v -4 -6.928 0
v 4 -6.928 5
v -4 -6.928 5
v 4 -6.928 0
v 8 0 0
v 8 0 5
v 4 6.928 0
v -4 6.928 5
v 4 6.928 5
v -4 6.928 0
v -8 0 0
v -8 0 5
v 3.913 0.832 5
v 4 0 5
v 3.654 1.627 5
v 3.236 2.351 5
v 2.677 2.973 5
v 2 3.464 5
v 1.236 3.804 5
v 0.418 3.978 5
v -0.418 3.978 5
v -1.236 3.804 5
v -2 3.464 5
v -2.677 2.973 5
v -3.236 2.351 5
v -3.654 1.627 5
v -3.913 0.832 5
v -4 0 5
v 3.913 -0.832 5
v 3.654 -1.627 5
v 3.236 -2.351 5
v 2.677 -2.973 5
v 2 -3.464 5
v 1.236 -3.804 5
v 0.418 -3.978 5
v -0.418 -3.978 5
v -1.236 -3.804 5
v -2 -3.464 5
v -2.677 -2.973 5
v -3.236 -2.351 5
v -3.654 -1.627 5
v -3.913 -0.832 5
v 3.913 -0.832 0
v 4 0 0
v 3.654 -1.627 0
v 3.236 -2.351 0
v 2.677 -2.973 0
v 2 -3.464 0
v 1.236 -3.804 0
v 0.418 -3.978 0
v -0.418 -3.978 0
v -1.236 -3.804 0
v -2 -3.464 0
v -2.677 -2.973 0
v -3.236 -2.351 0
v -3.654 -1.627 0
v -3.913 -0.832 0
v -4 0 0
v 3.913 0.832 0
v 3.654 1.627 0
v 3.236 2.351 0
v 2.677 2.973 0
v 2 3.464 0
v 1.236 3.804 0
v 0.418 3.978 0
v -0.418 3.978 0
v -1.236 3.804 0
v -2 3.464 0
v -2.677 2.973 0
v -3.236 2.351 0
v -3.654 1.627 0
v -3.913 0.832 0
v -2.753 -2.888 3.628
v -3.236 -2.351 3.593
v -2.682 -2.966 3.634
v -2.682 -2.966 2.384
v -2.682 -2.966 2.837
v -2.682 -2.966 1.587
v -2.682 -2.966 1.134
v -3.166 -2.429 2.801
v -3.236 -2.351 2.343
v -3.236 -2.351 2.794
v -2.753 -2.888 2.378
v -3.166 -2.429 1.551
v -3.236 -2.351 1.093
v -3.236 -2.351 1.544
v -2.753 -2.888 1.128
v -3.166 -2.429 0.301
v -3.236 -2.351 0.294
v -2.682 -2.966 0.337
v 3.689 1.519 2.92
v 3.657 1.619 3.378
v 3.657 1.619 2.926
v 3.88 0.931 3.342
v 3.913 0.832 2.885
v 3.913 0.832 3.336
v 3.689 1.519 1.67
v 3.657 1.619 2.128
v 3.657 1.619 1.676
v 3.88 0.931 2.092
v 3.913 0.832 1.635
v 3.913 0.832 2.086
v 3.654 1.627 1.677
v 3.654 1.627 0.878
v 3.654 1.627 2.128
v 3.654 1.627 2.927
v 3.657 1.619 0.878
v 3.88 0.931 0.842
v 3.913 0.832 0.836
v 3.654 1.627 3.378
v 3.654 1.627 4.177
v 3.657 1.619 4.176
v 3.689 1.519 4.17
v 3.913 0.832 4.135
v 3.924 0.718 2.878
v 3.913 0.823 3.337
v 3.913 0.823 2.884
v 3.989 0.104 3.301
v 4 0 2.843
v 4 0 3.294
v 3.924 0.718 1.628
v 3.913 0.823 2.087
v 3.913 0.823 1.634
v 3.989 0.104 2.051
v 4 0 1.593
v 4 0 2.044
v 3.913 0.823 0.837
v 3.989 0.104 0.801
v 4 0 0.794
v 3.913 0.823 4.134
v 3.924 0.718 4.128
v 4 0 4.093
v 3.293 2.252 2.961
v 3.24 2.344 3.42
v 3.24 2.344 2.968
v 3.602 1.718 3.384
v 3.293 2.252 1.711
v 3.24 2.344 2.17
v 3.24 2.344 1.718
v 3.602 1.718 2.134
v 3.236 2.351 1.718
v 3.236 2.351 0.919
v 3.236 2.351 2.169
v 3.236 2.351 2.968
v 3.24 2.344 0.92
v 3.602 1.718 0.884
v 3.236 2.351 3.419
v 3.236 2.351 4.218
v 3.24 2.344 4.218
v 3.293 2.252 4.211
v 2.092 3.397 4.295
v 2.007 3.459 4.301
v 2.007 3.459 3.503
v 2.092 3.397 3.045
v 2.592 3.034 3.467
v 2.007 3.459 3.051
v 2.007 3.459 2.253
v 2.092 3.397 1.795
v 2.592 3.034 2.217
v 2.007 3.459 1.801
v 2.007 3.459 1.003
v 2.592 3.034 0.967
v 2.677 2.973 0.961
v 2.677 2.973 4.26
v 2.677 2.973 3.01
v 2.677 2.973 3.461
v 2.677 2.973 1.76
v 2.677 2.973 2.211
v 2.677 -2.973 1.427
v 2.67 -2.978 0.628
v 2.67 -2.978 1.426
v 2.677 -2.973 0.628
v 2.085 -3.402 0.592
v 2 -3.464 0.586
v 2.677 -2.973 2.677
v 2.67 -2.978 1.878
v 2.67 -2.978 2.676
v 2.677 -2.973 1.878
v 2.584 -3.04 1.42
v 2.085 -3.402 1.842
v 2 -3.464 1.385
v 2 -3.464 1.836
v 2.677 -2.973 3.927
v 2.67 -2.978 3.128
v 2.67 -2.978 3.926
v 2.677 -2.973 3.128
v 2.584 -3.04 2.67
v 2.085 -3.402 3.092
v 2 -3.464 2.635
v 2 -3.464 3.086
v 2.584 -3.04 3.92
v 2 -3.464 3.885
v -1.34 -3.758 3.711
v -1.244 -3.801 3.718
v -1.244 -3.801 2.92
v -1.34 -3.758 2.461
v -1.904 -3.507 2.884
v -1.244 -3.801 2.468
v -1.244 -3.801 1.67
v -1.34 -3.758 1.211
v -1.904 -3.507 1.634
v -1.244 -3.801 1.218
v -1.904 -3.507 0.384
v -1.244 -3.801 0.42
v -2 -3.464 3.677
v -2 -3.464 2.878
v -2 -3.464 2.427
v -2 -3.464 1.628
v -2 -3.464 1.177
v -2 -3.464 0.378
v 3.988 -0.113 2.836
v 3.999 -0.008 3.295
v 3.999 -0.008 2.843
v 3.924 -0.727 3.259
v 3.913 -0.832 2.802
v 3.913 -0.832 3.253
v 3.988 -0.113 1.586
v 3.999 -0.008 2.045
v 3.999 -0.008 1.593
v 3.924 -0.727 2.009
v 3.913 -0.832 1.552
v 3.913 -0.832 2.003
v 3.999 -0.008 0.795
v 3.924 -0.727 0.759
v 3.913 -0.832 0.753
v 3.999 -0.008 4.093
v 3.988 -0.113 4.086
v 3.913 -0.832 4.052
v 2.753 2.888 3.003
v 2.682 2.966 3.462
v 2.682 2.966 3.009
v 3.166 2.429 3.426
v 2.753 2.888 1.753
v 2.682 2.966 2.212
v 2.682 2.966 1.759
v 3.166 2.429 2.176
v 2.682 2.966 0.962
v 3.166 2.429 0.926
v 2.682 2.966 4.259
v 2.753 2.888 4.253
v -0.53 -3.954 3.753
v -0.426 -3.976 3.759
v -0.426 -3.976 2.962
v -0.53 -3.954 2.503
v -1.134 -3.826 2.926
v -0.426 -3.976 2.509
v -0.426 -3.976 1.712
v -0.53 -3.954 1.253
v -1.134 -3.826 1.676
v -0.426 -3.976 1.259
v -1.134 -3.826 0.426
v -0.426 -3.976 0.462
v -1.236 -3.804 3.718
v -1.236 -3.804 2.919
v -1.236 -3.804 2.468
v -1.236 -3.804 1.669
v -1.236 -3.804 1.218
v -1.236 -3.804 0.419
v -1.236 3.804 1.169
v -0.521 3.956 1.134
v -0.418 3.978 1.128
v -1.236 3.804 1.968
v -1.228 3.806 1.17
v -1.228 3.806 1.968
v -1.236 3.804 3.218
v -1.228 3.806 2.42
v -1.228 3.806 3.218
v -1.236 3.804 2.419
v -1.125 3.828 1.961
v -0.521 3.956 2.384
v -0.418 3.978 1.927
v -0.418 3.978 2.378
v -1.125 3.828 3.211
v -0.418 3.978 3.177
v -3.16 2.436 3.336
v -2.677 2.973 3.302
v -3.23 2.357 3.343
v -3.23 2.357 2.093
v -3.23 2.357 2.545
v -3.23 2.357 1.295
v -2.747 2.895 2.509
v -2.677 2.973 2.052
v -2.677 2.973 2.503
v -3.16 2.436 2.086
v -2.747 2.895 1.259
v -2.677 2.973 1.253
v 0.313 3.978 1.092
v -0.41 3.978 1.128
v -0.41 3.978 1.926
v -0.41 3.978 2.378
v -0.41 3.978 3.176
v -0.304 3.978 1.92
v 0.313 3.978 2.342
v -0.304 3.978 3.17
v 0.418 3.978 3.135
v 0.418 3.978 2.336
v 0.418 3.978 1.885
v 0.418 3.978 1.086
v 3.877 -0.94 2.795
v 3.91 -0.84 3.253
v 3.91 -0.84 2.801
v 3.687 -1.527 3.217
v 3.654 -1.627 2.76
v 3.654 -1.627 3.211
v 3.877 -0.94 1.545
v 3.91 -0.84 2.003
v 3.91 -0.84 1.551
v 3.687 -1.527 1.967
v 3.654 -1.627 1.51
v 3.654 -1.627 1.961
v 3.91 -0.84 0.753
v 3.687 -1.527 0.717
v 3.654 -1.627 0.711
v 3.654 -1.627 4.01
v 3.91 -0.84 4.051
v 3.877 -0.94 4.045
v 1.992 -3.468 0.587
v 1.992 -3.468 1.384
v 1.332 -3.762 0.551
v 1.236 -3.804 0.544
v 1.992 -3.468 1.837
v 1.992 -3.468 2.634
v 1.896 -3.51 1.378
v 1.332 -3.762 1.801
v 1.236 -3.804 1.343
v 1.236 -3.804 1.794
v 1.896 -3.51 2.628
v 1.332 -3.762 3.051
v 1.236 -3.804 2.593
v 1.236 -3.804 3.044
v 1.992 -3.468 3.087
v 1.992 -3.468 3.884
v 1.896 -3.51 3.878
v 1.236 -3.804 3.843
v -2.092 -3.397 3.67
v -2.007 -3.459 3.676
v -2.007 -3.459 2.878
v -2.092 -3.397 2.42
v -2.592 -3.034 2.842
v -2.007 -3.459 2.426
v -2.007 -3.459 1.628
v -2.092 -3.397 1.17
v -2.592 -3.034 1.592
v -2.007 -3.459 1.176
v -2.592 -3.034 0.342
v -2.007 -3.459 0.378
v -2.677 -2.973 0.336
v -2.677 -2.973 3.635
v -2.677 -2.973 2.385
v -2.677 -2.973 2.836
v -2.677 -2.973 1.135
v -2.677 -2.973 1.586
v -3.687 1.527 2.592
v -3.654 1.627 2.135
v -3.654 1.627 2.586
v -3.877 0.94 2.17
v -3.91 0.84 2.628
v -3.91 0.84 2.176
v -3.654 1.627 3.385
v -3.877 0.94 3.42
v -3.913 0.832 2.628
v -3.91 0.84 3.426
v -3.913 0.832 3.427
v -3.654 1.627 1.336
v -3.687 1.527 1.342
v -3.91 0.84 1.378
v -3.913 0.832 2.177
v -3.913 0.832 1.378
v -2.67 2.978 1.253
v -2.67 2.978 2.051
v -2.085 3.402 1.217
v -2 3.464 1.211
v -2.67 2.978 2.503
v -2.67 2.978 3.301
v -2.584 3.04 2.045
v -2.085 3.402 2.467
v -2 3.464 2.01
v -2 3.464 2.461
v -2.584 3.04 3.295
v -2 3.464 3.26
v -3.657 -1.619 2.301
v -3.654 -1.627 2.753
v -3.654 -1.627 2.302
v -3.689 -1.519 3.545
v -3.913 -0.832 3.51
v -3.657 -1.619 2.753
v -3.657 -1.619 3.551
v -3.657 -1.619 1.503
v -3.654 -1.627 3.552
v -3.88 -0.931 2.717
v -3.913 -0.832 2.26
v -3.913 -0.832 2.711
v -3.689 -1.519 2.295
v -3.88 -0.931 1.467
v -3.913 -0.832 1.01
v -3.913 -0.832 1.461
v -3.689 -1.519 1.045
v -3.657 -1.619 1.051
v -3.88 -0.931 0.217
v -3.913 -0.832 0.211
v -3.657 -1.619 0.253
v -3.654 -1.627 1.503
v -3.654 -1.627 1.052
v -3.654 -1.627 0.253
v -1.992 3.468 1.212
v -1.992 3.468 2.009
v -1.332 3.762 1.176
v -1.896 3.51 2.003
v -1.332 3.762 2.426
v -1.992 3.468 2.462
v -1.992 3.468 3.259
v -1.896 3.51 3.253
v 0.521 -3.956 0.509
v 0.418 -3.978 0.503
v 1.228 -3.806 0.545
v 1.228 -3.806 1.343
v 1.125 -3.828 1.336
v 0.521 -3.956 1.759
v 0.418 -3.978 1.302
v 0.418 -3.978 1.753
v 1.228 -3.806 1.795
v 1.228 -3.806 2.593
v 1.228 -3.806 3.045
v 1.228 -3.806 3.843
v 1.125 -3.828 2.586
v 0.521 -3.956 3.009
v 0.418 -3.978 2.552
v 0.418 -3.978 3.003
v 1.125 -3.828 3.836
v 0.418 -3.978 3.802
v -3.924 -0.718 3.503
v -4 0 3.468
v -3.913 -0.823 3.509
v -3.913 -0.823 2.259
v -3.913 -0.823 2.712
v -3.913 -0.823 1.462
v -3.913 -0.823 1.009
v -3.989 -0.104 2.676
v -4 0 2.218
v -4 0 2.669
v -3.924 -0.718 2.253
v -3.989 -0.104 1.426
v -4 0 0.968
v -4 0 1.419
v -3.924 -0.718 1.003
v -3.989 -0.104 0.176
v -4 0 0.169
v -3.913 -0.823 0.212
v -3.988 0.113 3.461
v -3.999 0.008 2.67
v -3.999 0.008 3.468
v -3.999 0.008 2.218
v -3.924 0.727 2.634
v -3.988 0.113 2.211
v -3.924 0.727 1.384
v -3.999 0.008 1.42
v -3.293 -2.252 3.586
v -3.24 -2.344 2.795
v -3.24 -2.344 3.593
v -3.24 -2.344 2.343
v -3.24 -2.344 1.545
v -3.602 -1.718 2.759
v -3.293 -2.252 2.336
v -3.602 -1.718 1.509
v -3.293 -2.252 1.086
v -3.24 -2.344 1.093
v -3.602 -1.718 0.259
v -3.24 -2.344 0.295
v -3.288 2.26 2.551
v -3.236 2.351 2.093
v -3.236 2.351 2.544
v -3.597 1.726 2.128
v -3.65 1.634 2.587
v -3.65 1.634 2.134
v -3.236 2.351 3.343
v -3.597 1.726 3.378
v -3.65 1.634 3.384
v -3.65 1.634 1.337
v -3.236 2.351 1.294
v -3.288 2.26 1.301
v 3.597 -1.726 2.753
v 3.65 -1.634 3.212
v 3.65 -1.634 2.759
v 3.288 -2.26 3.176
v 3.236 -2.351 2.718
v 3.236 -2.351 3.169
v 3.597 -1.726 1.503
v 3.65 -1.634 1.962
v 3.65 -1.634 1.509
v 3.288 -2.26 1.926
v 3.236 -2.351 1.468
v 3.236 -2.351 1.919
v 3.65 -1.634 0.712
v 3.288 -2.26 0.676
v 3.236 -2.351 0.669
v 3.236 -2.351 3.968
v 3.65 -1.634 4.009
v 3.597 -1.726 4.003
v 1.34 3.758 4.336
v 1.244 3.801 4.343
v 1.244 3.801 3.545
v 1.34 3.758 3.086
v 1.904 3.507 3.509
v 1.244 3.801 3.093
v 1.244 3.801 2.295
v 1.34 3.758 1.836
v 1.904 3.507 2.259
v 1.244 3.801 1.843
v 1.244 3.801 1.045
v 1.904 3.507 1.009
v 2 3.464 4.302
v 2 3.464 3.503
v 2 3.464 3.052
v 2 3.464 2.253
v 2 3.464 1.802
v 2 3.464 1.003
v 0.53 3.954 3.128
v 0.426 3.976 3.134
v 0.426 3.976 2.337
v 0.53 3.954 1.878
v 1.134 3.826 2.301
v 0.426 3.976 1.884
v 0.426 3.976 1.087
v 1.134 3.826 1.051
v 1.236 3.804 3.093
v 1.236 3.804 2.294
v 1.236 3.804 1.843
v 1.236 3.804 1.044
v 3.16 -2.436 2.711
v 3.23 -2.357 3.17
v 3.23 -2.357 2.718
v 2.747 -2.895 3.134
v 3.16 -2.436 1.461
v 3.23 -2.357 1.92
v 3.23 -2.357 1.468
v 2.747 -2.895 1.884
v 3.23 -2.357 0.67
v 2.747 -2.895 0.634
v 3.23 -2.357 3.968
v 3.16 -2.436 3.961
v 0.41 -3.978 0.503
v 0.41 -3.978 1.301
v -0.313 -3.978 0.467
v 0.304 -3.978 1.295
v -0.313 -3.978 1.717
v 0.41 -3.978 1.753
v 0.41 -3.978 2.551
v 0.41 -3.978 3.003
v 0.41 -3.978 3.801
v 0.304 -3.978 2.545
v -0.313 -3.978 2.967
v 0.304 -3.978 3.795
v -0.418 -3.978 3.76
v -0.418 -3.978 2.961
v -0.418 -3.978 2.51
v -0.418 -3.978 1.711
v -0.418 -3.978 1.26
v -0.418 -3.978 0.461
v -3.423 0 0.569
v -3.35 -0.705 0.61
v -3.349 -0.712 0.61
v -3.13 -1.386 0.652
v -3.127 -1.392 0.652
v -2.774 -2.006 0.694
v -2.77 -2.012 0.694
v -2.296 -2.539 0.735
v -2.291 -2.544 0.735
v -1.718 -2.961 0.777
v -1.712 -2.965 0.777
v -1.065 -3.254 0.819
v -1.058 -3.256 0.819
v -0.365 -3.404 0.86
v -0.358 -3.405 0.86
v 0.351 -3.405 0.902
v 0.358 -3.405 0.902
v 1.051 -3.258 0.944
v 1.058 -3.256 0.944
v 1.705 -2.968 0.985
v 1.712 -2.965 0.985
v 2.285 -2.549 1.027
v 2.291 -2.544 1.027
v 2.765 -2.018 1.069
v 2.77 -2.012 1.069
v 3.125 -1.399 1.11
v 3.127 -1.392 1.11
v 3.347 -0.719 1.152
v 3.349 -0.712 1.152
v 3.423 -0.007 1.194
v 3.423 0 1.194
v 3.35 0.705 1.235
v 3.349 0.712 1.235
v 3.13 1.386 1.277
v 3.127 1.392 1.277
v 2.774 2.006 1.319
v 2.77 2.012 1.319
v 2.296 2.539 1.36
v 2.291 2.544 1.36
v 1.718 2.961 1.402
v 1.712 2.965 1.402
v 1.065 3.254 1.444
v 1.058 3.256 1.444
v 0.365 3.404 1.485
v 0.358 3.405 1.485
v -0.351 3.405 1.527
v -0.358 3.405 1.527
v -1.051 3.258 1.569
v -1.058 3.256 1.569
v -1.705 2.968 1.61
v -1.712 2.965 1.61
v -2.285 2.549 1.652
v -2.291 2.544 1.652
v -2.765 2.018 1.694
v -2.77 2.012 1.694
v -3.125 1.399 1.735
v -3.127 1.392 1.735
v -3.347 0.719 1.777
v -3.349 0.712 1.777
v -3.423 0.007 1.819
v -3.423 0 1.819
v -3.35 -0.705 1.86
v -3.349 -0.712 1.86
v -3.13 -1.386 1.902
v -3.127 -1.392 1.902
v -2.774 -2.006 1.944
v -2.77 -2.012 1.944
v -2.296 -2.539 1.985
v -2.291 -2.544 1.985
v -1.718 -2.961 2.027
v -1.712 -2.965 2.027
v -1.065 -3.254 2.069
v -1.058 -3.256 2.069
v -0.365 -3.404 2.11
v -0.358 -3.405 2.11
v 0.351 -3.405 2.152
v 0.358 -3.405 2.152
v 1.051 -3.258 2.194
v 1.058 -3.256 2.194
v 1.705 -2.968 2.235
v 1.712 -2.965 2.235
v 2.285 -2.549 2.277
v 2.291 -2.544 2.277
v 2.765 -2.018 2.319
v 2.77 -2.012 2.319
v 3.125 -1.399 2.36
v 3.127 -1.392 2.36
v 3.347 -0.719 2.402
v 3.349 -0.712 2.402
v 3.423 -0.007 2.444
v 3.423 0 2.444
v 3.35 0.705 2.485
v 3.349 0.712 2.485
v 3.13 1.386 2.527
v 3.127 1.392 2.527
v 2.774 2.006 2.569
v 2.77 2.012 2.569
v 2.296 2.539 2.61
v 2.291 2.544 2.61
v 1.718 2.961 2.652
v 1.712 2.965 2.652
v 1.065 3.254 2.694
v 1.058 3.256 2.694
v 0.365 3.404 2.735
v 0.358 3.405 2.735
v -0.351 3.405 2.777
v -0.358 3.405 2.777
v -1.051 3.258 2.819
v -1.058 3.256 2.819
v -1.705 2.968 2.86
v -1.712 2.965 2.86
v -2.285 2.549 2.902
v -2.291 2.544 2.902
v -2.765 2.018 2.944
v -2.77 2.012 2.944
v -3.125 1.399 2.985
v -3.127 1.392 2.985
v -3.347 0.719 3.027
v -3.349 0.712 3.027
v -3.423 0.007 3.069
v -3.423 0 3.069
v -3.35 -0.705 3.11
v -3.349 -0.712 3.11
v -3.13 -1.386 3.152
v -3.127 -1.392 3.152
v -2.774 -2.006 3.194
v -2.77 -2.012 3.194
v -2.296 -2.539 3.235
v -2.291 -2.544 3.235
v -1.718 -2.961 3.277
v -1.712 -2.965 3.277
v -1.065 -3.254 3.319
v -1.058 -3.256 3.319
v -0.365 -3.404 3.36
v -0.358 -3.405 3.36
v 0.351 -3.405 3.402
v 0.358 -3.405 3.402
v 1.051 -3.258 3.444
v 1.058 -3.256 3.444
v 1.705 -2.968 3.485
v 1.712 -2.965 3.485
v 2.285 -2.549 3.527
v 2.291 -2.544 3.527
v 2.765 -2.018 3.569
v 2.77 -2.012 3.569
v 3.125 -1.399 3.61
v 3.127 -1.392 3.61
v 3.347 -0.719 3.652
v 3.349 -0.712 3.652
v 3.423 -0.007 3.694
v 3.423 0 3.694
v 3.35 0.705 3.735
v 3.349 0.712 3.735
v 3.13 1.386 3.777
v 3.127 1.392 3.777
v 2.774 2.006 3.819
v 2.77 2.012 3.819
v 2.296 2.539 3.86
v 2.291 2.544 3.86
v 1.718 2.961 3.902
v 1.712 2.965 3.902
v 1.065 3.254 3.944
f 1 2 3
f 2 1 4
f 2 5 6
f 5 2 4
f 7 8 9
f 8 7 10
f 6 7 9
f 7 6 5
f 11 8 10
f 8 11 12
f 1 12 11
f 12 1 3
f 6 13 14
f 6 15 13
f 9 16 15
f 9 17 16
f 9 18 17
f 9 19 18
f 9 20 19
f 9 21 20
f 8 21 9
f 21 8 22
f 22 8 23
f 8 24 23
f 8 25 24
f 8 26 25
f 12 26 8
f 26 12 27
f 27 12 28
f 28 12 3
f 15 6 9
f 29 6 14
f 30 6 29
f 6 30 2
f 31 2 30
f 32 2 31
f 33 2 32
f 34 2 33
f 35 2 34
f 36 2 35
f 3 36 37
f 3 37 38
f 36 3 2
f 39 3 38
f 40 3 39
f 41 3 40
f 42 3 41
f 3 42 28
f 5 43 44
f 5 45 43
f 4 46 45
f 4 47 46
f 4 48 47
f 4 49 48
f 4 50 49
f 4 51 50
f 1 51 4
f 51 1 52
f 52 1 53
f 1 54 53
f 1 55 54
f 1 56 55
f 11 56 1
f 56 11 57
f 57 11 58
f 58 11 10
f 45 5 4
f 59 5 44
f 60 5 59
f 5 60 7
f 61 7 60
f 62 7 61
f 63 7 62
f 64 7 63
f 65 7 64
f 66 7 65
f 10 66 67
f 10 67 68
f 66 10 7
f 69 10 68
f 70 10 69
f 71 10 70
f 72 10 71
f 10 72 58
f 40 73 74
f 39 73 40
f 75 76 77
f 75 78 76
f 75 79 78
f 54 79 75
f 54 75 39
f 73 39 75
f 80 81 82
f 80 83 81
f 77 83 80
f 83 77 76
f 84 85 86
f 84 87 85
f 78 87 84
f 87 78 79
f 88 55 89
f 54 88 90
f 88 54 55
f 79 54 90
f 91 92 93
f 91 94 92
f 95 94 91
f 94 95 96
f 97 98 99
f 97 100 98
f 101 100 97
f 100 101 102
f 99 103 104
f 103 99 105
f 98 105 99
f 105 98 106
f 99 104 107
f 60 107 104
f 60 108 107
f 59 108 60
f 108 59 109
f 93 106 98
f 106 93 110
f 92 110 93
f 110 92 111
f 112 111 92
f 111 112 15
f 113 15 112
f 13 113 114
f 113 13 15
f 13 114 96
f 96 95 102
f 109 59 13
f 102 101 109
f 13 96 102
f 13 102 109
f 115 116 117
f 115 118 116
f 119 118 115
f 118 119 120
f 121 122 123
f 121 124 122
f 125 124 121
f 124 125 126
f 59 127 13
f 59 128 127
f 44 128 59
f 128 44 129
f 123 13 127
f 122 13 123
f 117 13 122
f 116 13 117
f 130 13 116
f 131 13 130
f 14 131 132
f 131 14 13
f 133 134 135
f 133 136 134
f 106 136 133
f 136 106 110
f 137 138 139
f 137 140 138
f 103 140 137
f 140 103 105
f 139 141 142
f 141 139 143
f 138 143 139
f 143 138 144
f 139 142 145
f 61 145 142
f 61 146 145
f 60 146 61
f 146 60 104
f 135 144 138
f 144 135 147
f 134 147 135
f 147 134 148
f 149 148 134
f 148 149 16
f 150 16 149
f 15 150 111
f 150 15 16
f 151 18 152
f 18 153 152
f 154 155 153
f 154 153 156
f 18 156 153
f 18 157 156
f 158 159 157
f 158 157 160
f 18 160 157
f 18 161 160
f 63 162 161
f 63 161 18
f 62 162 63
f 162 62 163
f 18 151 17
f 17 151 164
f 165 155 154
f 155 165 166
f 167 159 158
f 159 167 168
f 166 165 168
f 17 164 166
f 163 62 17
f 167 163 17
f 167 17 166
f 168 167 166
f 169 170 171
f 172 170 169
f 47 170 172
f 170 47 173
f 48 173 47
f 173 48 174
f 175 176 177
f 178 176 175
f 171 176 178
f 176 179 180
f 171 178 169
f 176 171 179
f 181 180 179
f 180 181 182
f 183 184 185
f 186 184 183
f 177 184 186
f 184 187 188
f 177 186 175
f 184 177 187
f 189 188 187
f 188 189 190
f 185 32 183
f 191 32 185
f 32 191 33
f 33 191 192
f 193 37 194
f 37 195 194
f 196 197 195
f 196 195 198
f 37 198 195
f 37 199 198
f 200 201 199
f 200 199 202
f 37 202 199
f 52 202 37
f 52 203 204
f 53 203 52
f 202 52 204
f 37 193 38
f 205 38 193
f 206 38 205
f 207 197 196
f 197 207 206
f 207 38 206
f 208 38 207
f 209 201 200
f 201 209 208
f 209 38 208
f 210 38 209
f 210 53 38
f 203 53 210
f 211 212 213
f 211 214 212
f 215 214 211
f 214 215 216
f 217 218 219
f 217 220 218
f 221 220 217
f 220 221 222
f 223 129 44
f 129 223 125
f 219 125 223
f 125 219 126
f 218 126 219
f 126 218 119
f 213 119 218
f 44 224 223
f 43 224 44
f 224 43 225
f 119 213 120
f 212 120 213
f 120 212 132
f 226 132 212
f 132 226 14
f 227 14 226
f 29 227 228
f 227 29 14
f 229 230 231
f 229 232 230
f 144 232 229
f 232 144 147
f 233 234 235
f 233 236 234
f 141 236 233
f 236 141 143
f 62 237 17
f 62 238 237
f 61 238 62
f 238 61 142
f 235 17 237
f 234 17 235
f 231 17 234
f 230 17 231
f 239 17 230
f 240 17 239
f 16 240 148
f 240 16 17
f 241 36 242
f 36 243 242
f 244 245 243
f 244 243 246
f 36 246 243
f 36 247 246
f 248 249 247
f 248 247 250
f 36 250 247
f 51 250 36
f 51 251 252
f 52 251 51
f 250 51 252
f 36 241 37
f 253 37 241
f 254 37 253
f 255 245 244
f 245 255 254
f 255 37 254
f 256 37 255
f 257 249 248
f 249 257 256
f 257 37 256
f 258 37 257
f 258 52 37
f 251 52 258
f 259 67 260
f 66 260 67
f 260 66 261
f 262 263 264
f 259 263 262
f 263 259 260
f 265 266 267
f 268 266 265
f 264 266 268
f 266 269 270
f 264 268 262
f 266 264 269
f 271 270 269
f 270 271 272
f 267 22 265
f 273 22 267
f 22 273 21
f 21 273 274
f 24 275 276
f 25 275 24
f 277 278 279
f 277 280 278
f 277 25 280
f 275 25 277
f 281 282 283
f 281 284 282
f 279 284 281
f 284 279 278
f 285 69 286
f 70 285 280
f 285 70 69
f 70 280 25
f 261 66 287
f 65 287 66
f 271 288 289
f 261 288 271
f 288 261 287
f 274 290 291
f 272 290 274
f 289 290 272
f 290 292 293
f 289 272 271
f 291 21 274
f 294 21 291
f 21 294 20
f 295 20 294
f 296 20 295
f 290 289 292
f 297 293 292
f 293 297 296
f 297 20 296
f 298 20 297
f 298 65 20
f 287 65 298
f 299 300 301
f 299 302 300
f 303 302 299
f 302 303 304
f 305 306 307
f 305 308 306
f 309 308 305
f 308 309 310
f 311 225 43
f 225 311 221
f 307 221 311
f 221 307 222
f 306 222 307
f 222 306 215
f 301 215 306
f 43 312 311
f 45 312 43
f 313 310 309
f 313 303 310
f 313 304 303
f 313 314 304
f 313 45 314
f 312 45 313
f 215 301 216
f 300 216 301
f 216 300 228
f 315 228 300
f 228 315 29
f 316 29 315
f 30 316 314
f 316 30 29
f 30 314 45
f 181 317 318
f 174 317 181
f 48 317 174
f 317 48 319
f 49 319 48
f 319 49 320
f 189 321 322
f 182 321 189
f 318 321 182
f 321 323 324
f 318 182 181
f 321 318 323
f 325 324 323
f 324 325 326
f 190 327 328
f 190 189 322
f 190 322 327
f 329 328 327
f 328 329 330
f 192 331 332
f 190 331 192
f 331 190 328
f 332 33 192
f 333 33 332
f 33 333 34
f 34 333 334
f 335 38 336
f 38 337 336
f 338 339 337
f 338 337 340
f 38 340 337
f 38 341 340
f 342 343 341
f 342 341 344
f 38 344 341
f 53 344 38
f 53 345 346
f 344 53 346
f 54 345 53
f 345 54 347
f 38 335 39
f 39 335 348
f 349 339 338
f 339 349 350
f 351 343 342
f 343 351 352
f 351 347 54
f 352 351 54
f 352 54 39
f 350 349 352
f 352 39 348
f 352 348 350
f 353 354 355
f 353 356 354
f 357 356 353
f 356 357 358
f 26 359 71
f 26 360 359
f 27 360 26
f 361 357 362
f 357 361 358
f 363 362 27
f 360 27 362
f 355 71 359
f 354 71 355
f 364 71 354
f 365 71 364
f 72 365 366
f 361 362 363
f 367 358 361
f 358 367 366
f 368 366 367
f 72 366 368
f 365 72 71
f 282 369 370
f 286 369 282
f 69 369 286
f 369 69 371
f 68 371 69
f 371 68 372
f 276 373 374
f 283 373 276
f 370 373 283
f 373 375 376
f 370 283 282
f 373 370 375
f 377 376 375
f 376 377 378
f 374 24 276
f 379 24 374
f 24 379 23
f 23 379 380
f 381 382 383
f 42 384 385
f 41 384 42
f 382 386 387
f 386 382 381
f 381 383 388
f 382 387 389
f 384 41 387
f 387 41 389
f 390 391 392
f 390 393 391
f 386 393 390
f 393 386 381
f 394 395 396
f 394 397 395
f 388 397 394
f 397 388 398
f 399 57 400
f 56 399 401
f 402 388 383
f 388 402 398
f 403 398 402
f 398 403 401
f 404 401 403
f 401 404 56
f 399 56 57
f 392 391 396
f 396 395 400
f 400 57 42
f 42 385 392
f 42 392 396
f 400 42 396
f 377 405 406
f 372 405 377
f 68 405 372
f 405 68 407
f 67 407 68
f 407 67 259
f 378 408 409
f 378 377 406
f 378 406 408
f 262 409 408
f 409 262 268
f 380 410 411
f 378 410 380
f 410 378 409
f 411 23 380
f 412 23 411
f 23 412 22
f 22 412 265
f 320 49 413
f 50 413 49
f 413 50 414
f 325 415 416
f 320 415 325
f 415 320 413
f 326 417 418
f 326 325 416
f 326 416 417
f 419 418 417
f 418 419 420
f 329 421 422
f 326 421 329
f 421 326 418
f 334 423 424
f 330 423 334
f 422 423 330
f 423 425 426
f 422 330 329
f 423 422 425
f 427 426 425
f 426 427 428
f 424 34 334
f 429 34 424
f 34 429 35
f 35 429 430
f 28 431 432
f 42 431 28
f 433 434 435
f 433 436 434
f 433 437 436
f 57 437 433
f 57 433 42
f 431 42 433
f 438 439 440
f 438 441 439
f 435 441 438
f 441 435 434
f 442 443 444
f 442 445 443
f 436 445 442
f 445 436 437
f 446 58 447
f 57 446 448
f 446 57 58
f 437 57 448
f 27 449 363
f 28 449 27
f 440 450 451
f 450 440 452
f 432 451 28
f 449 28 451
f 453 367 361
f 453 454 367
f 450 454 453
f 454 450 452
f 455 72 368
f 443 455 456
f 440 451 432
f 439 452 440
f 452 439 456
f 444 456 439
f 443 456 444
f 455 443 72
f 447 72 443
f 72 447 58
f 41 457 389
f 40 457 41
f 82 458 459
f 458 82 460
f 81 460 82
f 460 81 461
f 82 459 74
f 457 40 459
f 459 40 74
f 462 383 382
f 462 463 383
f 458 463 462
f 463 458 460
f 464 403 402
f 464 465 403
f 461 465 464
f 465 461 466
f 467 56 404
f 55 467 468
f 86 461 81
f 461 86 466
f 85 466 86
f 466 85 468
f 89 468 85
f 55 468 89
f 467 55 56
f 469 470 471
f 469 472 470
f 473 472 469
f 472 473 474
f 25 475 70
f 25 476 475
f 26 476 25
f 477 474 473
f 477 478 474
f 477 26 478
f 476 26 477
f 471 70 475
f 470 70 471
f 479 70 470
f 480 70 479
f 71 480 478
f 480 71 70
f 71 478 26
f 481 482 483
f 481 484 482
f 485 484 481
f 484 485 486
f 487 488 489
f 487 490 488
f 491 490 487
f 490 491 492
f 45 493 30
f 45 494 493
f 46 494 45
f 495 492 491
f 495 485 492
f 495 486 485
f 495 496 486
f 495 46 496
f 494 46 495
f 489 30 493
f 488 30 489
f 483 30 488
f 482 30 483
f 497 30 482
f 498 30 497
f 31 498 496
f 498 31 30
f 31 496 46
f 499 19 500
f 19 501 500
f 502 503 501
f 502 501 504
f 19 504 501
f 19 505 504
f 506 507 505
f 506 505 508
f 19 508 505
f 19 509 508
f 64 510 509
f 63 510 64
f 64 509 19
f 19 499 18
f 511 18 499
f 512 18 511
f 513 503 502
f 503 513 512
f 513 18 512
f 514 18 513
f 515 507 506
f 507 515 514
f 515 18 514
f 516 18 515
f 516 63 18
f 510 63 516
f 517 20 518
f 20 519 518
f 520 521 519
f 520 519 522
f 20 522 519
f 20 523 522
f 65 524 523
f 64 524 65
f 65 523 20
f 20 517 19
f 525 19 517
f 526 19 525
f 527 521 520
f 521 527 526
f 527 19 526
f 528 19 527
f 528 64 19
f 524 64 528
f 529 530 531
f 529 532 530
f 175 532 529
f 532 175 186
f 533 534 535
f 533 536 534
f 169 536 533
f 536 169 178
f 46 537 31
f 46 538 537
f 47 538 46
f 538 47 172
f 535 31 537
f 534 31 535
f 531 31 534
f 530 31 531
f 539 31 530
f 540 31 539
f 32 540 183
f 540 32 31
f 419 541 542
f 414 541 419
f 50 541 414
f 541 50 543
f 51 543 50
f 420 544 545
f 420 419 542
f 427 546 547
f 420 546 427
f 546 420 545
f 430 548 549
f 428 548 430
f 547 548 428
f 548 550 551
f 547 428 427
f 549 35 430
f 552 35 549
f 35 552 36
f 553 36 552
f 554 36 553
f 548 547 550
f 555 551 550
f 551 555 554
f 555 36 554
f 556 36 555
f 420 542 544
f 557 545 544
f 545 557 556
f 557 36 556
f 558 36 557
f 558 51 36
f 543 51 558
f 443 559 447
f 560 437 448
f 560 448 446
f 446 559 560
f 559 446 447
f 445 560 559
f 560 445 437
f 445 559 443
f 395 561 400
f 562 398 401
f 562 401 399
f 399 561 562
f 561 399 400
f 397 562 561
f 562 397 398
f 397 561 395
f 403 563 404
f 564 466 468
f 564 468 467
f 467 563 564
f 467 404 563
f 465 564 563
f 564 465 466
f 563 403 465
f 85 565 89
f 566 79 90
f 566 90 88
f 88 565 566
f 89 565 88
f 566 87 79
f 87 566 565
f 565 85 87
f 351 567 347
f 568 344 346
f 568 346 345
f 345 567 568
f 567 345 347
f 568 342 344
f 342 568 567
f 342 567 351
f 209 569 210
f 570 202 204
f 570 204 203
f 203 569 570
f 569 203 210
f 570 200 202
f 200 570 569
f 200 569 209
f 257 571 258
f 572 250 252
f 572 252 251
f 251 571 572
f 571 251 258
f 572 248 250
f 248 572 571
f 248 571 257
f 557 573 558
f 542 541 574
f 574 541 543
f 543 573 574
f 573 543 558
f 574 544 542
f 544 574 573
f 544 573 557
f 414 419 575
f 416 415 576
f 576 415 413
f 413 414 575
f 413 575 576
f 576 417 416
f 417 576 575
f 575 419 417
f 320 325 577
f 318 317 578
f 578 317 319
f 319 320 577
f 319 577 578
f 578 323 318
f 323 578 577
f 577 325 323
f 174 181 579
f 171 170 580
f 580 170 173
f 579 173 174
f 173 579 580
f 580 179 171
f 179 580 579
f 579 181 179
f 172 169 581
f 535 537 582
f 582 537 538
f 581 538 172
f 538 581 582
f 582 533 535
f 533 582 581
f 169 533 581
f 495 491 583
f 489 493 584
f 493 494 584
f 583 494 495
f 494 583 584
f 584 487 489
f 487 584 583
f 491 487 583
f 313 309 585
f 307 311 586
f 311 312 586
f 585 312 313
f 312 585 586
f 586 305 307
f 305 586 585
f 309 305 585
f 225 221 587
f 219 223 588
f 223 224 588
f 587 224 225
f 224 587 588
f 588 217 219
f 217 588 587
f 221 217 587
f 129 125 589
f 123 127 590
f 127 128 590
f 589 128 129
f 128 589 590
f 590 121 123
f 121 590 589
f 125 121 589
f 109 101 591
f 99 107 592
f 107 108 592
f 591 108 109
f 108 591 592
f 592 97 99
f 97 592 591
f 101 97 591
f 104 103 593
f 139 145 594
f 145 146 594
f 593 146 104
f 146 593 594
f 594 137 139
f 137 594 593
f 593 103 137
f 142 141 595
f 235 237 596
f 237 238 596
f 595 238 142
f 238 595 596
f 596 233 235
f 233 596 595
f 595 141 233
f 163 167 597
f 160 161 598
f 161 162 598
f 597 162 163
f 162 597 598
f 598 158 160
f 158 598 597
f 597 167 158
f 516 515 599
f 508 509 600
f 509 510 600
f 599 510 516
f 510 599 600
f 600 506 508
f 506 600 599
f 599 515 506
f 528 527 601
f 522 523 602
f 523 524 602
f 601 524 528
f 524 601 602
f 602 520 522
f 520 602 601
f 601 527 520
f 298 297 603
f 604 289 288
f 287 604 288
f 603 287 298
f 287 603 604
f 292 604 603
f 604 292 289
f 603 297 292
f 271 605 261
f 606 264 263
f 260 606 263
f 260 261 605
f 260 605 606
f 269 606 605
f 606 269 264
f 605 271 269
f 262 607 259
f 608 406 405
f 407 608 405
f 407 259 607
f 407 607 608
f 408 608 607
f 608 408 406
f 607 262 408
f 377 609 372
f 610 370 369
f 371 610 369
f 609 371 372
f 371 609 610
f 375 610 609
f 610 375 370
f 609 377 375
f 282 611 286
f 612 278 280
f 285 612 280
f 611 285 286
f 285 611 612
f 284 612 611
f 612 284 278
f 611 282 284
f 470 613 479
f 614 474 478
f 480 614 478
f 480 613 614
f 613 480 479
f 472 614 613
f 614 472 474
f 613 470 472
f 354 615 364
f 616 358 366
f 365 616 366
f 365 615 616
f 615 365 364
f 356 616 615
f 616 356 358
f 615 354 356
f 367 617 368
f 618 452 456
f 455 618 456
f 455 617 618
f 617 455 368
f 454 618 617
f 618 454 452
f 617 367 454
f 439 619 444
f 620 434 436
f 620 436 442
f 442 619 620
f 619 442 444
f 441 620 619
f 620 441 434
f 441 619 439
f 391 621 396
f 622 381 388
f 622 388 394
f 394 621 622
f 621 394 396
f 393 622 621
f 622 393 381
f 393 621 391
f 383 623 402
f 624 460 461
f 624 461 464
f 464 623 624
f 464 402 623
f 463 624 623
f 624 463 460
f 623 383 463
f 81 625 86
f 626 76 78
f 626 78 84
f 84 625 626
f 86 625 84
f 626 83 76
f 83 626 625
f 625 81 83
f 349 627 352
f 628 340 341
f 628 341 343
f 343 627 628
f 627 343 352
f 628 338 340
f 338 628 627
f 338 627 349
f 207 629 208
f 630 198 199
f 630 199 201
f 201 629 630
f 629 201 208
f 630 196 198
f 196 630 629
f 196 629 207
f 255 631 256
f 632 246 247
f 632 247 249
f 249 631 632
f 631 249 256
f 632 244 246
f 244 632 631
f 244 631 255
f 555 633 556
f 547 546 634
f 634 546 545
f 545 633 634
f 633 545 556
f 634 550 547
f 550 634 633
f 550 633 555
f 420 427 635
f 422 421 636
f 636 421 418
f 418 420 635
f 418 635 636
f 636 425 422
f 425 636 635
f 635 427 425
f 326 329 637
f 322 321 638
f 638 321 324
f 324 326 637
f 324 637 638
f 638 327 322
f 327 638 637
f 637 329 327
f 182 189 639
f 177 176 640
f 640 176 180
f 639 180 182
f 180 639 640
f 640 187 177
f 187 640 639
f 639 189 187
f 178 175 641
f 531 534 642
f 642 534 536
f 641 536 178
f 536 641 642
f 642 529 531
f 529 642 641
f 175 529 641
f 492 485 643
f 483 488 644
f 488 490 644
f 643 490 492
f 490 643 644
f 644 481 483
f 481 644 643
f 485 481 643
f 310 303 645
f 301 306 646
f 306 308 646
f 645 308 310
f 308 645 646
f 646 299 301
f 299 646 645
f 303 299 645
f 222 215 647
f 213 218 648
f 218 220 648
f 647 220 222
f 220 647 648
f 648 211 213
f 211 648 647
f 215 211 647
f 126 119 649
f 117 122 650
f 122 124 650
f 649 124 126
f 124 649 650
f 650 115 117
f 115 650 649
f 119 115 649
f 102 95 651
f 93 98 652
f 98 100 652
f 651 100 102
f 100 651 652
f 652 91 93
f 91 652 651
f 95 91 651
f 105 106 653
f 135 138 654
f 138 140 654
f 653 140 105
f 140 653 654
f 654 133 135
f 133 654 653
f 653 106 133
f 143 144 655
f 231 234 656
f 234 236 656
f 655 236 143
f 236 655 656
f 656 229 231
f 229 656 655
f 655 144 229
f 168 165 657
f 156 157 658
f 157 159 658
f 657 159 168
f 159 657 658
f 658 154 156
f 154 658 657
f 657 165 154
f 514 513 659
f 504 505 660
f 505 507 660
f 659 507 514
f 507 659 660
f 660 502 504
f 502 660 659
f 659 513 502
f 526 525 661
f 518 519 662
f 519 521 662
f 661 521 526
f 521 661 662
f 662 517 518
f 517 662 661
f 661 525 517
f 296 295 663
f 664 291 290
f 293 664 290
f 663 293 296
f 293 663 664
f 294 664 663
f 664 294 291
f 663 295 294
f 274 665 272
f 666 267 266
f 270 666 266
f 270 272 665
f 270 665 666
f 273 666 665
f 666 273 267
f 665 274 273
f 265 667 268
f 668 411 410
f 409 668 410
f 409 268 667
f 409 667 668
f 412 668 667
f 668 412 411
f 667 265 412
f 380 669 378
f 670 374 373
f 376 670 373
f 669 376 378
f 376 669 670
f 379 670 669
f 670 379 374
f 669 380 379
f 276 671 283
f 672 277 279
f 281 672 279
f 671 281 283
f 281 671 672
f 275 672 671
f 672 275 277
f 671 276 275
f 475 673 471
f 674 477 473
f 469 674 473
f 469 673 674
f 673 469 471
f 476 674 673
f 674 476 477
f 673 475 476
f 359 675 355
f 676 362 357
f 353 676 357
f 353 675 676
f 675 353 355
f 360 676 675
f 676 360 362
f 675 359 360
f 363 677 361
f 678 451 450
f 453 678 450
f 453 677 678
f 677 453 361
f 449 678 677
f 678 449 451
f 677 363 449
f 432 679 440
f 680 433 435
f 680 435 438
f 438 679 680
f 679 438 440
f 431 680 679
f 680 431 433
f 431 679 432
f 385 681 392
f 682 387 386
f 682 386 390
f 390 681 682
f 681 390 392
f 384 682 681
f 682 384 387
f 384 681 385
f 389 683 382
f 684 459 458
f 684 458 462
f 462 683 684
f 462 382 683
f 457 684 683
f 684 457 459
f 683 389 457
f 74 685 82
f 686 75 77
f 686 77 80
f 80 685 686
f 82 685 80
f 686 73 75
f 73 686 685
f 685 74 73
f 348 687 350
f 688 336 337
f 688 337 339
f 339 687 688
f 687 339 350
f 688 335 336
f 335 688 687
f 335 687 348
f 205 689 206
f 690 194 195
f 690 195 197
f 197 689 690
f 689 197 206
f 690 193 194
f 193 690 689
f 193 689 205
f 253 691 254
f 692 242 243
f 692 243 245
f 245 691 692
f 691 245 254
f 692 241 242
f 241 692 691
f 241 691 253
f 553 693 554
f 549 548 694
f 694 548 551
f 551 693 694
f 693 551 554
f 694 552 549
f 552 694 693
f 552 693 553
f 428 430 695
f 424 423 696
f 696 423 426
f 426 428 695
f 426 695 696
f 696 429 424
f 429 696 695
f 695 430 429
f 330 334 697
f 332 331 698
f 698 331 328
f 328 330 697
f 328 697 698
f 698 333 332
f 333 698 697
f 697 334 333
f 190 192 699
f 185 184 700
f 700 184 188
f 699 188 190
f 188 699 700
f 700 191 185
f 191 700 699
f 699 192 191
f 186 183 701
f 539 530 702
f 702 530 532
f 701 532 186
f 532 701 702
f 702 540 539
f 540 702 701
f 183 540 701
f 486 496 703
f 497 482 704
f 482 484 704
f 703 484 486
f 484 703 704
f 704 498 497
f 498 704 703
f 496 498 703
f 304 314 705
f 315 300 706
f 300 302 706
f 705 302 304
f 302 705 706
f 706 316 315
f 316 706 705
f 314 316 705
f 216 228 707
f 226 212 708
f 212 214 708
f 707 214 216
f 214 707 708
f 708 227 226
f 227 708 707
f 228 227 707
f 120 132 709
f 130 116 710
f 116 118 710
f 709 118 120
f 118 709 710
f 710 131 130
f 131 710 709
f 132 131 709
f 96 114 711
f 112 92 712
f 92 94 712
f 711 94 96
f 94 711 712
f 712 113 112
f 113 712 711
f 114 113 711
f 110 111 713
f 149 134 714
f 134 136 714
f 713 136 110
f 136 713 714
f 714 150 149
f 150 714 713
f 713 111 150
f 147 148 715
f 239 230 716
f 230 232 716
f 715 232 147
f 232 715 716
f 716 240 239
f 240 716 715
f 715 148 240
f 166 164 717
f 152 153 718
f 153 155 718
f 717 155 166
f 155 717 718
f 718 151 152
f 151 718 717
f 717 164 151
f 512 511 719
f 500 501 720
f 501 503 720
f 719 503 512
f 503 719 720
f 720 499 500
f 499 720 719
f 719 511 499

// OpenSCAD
// ISO Metric Thread Implementation
// Trevor Moseley
// 26/04/2014
// Public Domain https://www.thingiverse.com/thing:311031/comments#comment-6423499

// For thread dimensions see
//   http://en.wikipedia.org/wiki/File:ISO_and_UTS_Thread_Dimensions.svg

/* [Global] */

// What quality?
$fn = 30;	// [20,30,40,50,60,70,80,90,100]

// What Wrench (Spanner) sizes?
WrenchSizes = 0;	// [0:Rolson sizes,1:Fairbury sizes]

// Nuts or Bolts?
Type = 0;	// [0:Nuts,1:Bolts]

// What size of metric thread?
Thread = 8;	//[5:100]

// What length of thread (mm)?
Length = 16;	//[5:100]

// How many accross (y)?
Accros = 1;	// [1:20]

// How many down (x)?
Down = 1;	// [1:20]

// Spacing between centres?
Space = 17;	// [5:200]

do_it();

module do_it()
{
	for (ac=[1:Accros])
	{
		for (dn=[1:Down])
		{
			translate([
				-(((Accros-1)*Space)/2)+((ac-1)*Space),
				-(((Down-1)*Space)/2)+((dn-1)*Space),
				0])
			{
				if (Type==0)
					hex_nut(Thread);
				else
					hex_bolt(Thread,Length);
			}
		}
	}
}

//--demo functions--------------------------------------------------------------

//hex_bolt(10,16);						// make an M10 x 16 ISO bolt
//hex_nut(10);							// make an M10 ISO nut
//hex_bolt(8,16);						// make an M8 x 16 ISO bolt
//hex_nut(8);							// make an M8 ISO nut
//hex_bolt(6,12);						// make an M6 x 12 ISO bolt
//hex_nut(6);							// make an M6 ISO nut
//thread_out(8,16);					// make an M8 x 16 ISO thread
//thread_out_centre(8,16);				// make a centre for an M8 x 16 ISO thread
//thread_out_pitch(8,16,1.0);			// make an M8 x 16 thread with 1 mm pitch
//thread_out_centre_pitch(8,16,0.5);	// make the centre for an M8 x 16 thread with 1 mm pitch
//thread_in(8,10);						// make an M8 x 10 ISO thread
//thread_in_ring(8,10,2);				// make a ring to enclose an M8 x 10 ISO thread with thickness 2 mm
//thread_in_pitch(8,10,1.0);			// make an M8 x 10 thread with 1mm pitch

//--pitch-----------------------------------------------------------------------
// function for ISO coarse thread pitch (these are specified by ISO)
function get_coarse_pitch(dia) = lookup(dia, [
[1,0.25],[1.2,0.25],[1.4,0.3],[1.6,0.35],[1.8,0.35],[2,0.4],[2.5,0.45],[3,0.5],[3.5,0.6],[4,0.7],[5,0.8],[6,1],[7,1],[8,1.25],[10,1.5],[12,1.75],[14,2],[16,2],[18,2.5],[20,2.5],[22,2.5],[24,3],[27,3],[30,3.5],[33,3.5],[36,4],[39,4],[42,4.5],[45,4.5],[48,5],[52,5],[56,5.5],[60,5.5],[64,6],[78,5]]);

//--nut dims--------------------------------------------------------------------
// these are NOT specified by ISO
// support is provided for Rolson or Fairbury sizes, see WrenchSizes above

// function for Rolson hex nut diameter from thread size
function rolson_hex_nut_dia(dia) = lookup(dia, [
[3,6.4],[4,8.1],[5,9.2],[6,11.5],[8,16.0],[10,19.6],[12,22.1],[16,27.7],[20,34.6],[24,41.6],[30,53.1],[36,63.5]]);
// function for Rolson hex nut height from thread size
function rolson_hex_nut_hi(dia) = lookup(dia, [
[3,2.4],[4,3.2],[5,4],[6,3],[8,5],[10,5],[12,10],[16,13],[20,16],[24,19],[30,24],[36,29]]);

// function for Fairbury hex nut diameter from thread size
function fairbury_hex_nut_dia(dia) = lookup(dia, [
[3,6.0],[4,7.7],[5,8.8],[6,11.0],[8,14.4],[10,17.8],[12,20.0],[16,26.8],[20,33.0],[24,40.0],[30,50.9],[36,60.8]]);
// function for Fairbury hex nut height from thread size
function fairbury_hex_nut_hi(dia) = lookup(dia, [
[3,2.2],[4,3.0],[5,4.5],[6,5.0],[8,6.5],[10,8.1],[12,10.4],[16,14.2],[20,17],[24,20.3],[30,24.4],[36,29.5]]);

//--bolt dims-------------------------------------------------------------------
// these are NOT specified by ISO
// support is provided for Rolson or Fairbury sizes, see WrenchSizes above

// function for Rolson hex bolt head diameter from thread size
function rolson_hex_bolt_dia(dia) = lookup(dia, [
[3,6.4],[4,8.1],[5,9.2],[6,11.5],[8,14.0],[10,16],[12,22.1],[16,27.7],[20,34.6],[24,41.6],[30,53.1],[36,63.5]]);
// function for Rolson hex bolt head height from thread size
function rolson_hex_bolt_hi(dia) = lookup(dia, [
[3,2.4],[4,3.2],[5,4],[6,3.5],[8,4.5],[10,5],[12,10],[16,13],[20,16],[24,19],[30,24],[36,29]]);

// function for Fairbury hex bolt head diameter from thread size
function fairbury_hex_bolt_dia(dia) = lookup(dia, [
[3,6.4],[4,8.1],[5,8.8],[6,11.1],[8,14.4],[10,17.8],[12,20.1],[16,26.8],[20,33.0],[24,39.6],[30,50.9],[36,60.8]]);
// function for Fairbury hex bolt head height from thread size
function fairbury_hex_bolt_hi(dia) = lookup(dia, [
[3,2.4],[4,3.2],[5,3.4],[6,3.9],[8,5.1],[10,6.2],[12,7.3],[16,9.7],[20,12.2],[24,14.6],[30,17.9],[36,21.7]]);

//--top level modules-----------------------------------------------------------

module hex_bolt(dia,hi)
// make an ISO bolt
//  dia=diameter, 6=M6 etc.
//  hi=length of threaded part of bolt
{
	if (WrenchSizes==0)	rolson_hex_bolt(dia,hi);
	else					fairbury_hex_bolt(dia,hi);
}

module hex_nut(dia,hi)
// make an ISO nut
//  dia=diameter, 6=M6 etc.
{
	if (WrenchSizes==0)	rolson_hex_nut(dia);
	else					fairbury_hex_nut(dia);
}

module thread_out(dia,hi,thr=$fn)
// make an outside ISO thread (as used on a bolt)
//  dia=diameter, 6=M6 etc
//  hi=height, 10=make a 10mm long thread
//  thr=thread quality, 10=make a thread with 10 segments per turn
{
	p = get_coarse_pitch(dia);
	thread_out_pitch(dia,hi,p,thr);
}

module thread_in(dia,hi,thr=$fn)
// make an inside thread (as used on a nut)
//  dia = diameter, 6=M6 etc
//  hi = height, 10=make a 10mm long thread
//  thr = thread quality, 10=make a thread with 10 segments per turn
{
	p = get_coarse_pitch(dia);
	thread_in_pitch(dia,hi,p,thr);
}

module thread_out_pitch(dia,hi,p,thr=$fn)
// make an outside thread (as used on a bolt) with supplied pitch
//  dia=diameter, 6=M6 etc
//  hi=height, 10=make a 10mm long thread
//  p=pitch
//  thr=thread quality, 10=make a thread with 10 segments per turn
{
	h=(cos(30)*p)/8;
	Rmin=(dia/2)-(5*h);	// as wiki Dmin
	s=360/thr;				// length of segment in degrees
	t1=(hi-p)/p;			// number of full turns
	r=t1%1.0;				// length remaining (not full turn)
	t=t1-r;					// integer number of full turns
	n=r/(p/thr);			// number of segments for remainder
	// do full turns
	for(tn=[0:t-1])
		translate([0,0,tn*p])	th_out_turn(dia,p,thr);
	// do remainder
	for(sg=[0:n])
		th_out_pt(Rmin+0.1,p,s,sg+(t*thr),thr,h,p/thr);
}

module thread_in_pitch(dia,hi,p,thr=$fn)
// make an inside thread (as used on a nut)
//  dia = diameter, 6=M6 etc
//  hi = height, 10=make a 10mm long thread
//  p=pitch
//  thr = thread quality, 10=make a thread with 10 segments per turn
{
	h=(cos(30)*p)/8;
	Rmin=(dia/2)-(5*h);	// as wiki Dmin
	s=360/thr;				// length of segment in degrees
	t1=(hi-p)/p;			// number of full turns
	r=t1%1.0;				// length remaining (not full turn)
	t=t1-r;					// integer number of turns
	n=r/(p/thr);			// number of segments for remainder
	for(tn=[0:t-1])
		translate([0,0,tn*p])	th_in_turn(dia,p,thr);
	for(sg=[0:n])
		th_in_pt(Rmin+0.1,p,s,sg+(t*thr),thr,h,p/thr);
}

module thread_out_centre(dia,hi)
{
	p = get_coarse_pitch(dia);
	thread_out_centre_pitch(dia,hi,p);
}

module thread_out_centre_pitch(dia,hi,p)
{
	h = (cos(30)*p)/8;
	Rmin = (dia/2) - (5*h);	// as wiki Dmin
	cylinder(r = Rmin, h = hi);
}

module thread_in_ring(dia,hi,thk)
{
	difference()
	{
		cylinder(r = (dia/2)+0.5,h = hi);
		translate([0,0,-1]) cylinder(r = (dia/2)+0.1, h = hi+thk);
	}
}

//--low level modules-----------------------------------------------------------

module rolson_hex_bolt(dia,hi)
// make an ISO bolt with Rolson wrench sizes
//  dia=diameter, 6=M6 etc.
//  hi=length of threaded part of bolt
{
	hhi = rolson_hex_bolt_hi(dia);
	cylinder(r = rolson_hex_bolt_dia(dia)/2,h = hhi, $fn=6);
	translate([0,0,hhi-0.1])	thread_out(dia,hi+0.1);
	translate([0,0,hhi-0.1])	thread_out_centre(dia,hi+0.1);
}

module fairbury_hex_bolt(dia,hi)
// make an ISO bolt with Fairbury wrench sizes
//  dia=diameter, 6=M6 etc.
//  hi=length of threaded part of bolt
{
	hhi = fairbury_hex_bolt_hi(dia);
	cylinder(r = fairbury_hex_bolt_dia(dia)/2,h = hhi, $fn=6);
	translate([0,0,hhi-0.1])	thread_out(dia,hi+0.1);
	translate([0,0,hhi-0.1])	thread_out_centre(dia,hi+0.1);
}

module rolson_hex_nut(dia)
// make an ISO nut with Rolson wrench sizes
//  dia=diameter, 6=M6 etc.
{
	hi = rolson_hex_nut_hi(dia);
	difference()
	{
		cylinder(r = rolson_hex_nut_dia(dia)/2,h = hi, $fn=6);
		translate([0,0,-0.1])	cylinder(r = dia/2, h =hi + 0.2);
	}
	translate([0,0,0.1])	thread_in(dia,hi-0.2);
}

module fairbury_hex_nut(dia)
// make an ISO nut with Fairbury wrench sizes
//  dia=diameter, 6=M6 etc.
{
	hi = fairbury_hex_nut_hi(dia);
	difference()
	{
		cylinder(r = fairbury_hex_nut_dia(dia)/2,h = hi, $fn=6);
		translate([0,0,-0.1])	cylinder(r = dia/2, h =hi + 0.2);
	}
	translate([0,0,0.1])	thread_in(dia,hi-0.2);
}

module th_out_turn(dia,p,thr=$fn)
// make a single turn of an outside thread
//  dia=diameter, 6=M6 etc
//  p=pitch
//  thr=thread quality, 10=make a thread with 10 segments per turn
{
	h = (cos(30)*p)/8;
	Rmin = (dia/2) - (5*h);	// as wiki Dmin
	s = 360/thr;
	for(sg=[0:thr-1])
		th_out_pt(Rmin+0.1,p,s,sg,thr,h,p/thr);
}

module th_out_pt(rt,p,s,sg,thr,h,sh)
// make a part of an outside thread (single segment)
//  rt = radius of thread (nearest centre)
//  p = pitch
//  s = segment length (degrees)
//  sg = segment number
//  thr = segments in circumference
//  h = ISO h of thread / 8
//  sh = segment height (z)
{
	as = (sg % thr) * s;			// angle to start of seg
	ae = as + s  - (s/100);		// angle to end of seg (with overlap)
	z = sh*sg;
	//pp = p/2;
	//   1,4
	//   |\
	//   | \  2,5
 	//   | /
	//   |/
	//   0,3
	//  view from front (x & z) extruded in y by sg
	//
	//echo(str("as=",as,", ae=",ae," z=",z));
	polyhedron(
		points = [
			[cos(as)*rt,sin(as)*rt,z],								// 0
			[cos(as)*rt,sin(as)*rt,z+(3/4*p)],						// 1
			[cos(as)*(rt+(5*h)),sin(as)*(rt+(5*h)),z+(3/8*p)],		// 2
			[cos(ae)*rt,sin(ae)*rt,z+sh],							// 3
			[cos(ae)*rt,sin(ae)*rt,z+(3/4*p)+sh],					// 4
			[cos(ae)*(rt+(5*h)),sin(ae)*(rt+(5*h)),z+sh+(3/8*p)]],	// 5
		faces = [
			[0,1,2],			// near face
			[3,5,4],			// far face
			[0,3,4],[0,4,1],	// left face
			[0,5,3],[0,2,5],	// bottom face
			[1,4,5],[1,5,2]]);	// top face
}

module th_in_turn(dia,p,thr=$fn)
// make an single turn of an inside thread
//  dia = diameter, 6=M6 etc
//  p=pitch
//  thr = thread quality, 10=make a thread with 10 segments per turn
{
	h = (cos(30)*p)/8;
	Rmin = (dia/2) - (5*h);	// as wiki Dmin
	s = 360/thr;
	for(sg=[0:thr-1])
		th_in_pt(Rmin+0.1,p,s,sg,thr,h,p/thr);
}

module th_in_pt(rt,p,s,sg,thr,h,sh)
// make a part of an inside thread (single segment)
//  rt = radius of thread (nearest centre)
//  p = pitch
//  s = segment length (degrees)
//  sg = segment number
//  thr = segments in circumference
//  h = ISO h of thread / 8
//  sh = segment height (z)
{
	as = ((sg % thr) * s - 180);	// angle to start of seg
	ae = as + s -(s/100);		// angle to end of seg (with overlap)
	z = sh*sg;
	pp = p/2;
	//         2,5
	//          /|
	//     1,4 / |
 	//         \ |
	//          \|
	//         0,3
	//  view from front (x & z) extruded in y by sg
	//
	polyhedron(
		points = [
			[cos(as)*(rt+(5*h)),sin(as)*(rt+(5*h)),z],				//0
			[cos(as)*rt,sin(as)*rt,z+(3/8*p)],						//1
			[cos(as)*(rt+(5*h)),sin(as)*(rt+(5*h)),z+(3/4*p)],		//2
			[cos(ae)*(rt+(5*h)),sin(ae)*(rt+(5*h)),z+sh],			//3
			[cos(ae)*rt,sin(ae)*rt,z+(3/8*p)+sh],					//4
			[cos(ae)*(rt+(5*h)),sin(ae)*(rt+(5*h)),z+(3/4*p)+sh]],	//5
		triangles = [
			[0,1,2],			// near face
			[3,5,4],			// far face
			[0,3,4],[0,4,1],	// left face
			[0,5,3],[0,2,5],	// bottom face
			[1,4,5],[1,5,2]]);	// top face
}
